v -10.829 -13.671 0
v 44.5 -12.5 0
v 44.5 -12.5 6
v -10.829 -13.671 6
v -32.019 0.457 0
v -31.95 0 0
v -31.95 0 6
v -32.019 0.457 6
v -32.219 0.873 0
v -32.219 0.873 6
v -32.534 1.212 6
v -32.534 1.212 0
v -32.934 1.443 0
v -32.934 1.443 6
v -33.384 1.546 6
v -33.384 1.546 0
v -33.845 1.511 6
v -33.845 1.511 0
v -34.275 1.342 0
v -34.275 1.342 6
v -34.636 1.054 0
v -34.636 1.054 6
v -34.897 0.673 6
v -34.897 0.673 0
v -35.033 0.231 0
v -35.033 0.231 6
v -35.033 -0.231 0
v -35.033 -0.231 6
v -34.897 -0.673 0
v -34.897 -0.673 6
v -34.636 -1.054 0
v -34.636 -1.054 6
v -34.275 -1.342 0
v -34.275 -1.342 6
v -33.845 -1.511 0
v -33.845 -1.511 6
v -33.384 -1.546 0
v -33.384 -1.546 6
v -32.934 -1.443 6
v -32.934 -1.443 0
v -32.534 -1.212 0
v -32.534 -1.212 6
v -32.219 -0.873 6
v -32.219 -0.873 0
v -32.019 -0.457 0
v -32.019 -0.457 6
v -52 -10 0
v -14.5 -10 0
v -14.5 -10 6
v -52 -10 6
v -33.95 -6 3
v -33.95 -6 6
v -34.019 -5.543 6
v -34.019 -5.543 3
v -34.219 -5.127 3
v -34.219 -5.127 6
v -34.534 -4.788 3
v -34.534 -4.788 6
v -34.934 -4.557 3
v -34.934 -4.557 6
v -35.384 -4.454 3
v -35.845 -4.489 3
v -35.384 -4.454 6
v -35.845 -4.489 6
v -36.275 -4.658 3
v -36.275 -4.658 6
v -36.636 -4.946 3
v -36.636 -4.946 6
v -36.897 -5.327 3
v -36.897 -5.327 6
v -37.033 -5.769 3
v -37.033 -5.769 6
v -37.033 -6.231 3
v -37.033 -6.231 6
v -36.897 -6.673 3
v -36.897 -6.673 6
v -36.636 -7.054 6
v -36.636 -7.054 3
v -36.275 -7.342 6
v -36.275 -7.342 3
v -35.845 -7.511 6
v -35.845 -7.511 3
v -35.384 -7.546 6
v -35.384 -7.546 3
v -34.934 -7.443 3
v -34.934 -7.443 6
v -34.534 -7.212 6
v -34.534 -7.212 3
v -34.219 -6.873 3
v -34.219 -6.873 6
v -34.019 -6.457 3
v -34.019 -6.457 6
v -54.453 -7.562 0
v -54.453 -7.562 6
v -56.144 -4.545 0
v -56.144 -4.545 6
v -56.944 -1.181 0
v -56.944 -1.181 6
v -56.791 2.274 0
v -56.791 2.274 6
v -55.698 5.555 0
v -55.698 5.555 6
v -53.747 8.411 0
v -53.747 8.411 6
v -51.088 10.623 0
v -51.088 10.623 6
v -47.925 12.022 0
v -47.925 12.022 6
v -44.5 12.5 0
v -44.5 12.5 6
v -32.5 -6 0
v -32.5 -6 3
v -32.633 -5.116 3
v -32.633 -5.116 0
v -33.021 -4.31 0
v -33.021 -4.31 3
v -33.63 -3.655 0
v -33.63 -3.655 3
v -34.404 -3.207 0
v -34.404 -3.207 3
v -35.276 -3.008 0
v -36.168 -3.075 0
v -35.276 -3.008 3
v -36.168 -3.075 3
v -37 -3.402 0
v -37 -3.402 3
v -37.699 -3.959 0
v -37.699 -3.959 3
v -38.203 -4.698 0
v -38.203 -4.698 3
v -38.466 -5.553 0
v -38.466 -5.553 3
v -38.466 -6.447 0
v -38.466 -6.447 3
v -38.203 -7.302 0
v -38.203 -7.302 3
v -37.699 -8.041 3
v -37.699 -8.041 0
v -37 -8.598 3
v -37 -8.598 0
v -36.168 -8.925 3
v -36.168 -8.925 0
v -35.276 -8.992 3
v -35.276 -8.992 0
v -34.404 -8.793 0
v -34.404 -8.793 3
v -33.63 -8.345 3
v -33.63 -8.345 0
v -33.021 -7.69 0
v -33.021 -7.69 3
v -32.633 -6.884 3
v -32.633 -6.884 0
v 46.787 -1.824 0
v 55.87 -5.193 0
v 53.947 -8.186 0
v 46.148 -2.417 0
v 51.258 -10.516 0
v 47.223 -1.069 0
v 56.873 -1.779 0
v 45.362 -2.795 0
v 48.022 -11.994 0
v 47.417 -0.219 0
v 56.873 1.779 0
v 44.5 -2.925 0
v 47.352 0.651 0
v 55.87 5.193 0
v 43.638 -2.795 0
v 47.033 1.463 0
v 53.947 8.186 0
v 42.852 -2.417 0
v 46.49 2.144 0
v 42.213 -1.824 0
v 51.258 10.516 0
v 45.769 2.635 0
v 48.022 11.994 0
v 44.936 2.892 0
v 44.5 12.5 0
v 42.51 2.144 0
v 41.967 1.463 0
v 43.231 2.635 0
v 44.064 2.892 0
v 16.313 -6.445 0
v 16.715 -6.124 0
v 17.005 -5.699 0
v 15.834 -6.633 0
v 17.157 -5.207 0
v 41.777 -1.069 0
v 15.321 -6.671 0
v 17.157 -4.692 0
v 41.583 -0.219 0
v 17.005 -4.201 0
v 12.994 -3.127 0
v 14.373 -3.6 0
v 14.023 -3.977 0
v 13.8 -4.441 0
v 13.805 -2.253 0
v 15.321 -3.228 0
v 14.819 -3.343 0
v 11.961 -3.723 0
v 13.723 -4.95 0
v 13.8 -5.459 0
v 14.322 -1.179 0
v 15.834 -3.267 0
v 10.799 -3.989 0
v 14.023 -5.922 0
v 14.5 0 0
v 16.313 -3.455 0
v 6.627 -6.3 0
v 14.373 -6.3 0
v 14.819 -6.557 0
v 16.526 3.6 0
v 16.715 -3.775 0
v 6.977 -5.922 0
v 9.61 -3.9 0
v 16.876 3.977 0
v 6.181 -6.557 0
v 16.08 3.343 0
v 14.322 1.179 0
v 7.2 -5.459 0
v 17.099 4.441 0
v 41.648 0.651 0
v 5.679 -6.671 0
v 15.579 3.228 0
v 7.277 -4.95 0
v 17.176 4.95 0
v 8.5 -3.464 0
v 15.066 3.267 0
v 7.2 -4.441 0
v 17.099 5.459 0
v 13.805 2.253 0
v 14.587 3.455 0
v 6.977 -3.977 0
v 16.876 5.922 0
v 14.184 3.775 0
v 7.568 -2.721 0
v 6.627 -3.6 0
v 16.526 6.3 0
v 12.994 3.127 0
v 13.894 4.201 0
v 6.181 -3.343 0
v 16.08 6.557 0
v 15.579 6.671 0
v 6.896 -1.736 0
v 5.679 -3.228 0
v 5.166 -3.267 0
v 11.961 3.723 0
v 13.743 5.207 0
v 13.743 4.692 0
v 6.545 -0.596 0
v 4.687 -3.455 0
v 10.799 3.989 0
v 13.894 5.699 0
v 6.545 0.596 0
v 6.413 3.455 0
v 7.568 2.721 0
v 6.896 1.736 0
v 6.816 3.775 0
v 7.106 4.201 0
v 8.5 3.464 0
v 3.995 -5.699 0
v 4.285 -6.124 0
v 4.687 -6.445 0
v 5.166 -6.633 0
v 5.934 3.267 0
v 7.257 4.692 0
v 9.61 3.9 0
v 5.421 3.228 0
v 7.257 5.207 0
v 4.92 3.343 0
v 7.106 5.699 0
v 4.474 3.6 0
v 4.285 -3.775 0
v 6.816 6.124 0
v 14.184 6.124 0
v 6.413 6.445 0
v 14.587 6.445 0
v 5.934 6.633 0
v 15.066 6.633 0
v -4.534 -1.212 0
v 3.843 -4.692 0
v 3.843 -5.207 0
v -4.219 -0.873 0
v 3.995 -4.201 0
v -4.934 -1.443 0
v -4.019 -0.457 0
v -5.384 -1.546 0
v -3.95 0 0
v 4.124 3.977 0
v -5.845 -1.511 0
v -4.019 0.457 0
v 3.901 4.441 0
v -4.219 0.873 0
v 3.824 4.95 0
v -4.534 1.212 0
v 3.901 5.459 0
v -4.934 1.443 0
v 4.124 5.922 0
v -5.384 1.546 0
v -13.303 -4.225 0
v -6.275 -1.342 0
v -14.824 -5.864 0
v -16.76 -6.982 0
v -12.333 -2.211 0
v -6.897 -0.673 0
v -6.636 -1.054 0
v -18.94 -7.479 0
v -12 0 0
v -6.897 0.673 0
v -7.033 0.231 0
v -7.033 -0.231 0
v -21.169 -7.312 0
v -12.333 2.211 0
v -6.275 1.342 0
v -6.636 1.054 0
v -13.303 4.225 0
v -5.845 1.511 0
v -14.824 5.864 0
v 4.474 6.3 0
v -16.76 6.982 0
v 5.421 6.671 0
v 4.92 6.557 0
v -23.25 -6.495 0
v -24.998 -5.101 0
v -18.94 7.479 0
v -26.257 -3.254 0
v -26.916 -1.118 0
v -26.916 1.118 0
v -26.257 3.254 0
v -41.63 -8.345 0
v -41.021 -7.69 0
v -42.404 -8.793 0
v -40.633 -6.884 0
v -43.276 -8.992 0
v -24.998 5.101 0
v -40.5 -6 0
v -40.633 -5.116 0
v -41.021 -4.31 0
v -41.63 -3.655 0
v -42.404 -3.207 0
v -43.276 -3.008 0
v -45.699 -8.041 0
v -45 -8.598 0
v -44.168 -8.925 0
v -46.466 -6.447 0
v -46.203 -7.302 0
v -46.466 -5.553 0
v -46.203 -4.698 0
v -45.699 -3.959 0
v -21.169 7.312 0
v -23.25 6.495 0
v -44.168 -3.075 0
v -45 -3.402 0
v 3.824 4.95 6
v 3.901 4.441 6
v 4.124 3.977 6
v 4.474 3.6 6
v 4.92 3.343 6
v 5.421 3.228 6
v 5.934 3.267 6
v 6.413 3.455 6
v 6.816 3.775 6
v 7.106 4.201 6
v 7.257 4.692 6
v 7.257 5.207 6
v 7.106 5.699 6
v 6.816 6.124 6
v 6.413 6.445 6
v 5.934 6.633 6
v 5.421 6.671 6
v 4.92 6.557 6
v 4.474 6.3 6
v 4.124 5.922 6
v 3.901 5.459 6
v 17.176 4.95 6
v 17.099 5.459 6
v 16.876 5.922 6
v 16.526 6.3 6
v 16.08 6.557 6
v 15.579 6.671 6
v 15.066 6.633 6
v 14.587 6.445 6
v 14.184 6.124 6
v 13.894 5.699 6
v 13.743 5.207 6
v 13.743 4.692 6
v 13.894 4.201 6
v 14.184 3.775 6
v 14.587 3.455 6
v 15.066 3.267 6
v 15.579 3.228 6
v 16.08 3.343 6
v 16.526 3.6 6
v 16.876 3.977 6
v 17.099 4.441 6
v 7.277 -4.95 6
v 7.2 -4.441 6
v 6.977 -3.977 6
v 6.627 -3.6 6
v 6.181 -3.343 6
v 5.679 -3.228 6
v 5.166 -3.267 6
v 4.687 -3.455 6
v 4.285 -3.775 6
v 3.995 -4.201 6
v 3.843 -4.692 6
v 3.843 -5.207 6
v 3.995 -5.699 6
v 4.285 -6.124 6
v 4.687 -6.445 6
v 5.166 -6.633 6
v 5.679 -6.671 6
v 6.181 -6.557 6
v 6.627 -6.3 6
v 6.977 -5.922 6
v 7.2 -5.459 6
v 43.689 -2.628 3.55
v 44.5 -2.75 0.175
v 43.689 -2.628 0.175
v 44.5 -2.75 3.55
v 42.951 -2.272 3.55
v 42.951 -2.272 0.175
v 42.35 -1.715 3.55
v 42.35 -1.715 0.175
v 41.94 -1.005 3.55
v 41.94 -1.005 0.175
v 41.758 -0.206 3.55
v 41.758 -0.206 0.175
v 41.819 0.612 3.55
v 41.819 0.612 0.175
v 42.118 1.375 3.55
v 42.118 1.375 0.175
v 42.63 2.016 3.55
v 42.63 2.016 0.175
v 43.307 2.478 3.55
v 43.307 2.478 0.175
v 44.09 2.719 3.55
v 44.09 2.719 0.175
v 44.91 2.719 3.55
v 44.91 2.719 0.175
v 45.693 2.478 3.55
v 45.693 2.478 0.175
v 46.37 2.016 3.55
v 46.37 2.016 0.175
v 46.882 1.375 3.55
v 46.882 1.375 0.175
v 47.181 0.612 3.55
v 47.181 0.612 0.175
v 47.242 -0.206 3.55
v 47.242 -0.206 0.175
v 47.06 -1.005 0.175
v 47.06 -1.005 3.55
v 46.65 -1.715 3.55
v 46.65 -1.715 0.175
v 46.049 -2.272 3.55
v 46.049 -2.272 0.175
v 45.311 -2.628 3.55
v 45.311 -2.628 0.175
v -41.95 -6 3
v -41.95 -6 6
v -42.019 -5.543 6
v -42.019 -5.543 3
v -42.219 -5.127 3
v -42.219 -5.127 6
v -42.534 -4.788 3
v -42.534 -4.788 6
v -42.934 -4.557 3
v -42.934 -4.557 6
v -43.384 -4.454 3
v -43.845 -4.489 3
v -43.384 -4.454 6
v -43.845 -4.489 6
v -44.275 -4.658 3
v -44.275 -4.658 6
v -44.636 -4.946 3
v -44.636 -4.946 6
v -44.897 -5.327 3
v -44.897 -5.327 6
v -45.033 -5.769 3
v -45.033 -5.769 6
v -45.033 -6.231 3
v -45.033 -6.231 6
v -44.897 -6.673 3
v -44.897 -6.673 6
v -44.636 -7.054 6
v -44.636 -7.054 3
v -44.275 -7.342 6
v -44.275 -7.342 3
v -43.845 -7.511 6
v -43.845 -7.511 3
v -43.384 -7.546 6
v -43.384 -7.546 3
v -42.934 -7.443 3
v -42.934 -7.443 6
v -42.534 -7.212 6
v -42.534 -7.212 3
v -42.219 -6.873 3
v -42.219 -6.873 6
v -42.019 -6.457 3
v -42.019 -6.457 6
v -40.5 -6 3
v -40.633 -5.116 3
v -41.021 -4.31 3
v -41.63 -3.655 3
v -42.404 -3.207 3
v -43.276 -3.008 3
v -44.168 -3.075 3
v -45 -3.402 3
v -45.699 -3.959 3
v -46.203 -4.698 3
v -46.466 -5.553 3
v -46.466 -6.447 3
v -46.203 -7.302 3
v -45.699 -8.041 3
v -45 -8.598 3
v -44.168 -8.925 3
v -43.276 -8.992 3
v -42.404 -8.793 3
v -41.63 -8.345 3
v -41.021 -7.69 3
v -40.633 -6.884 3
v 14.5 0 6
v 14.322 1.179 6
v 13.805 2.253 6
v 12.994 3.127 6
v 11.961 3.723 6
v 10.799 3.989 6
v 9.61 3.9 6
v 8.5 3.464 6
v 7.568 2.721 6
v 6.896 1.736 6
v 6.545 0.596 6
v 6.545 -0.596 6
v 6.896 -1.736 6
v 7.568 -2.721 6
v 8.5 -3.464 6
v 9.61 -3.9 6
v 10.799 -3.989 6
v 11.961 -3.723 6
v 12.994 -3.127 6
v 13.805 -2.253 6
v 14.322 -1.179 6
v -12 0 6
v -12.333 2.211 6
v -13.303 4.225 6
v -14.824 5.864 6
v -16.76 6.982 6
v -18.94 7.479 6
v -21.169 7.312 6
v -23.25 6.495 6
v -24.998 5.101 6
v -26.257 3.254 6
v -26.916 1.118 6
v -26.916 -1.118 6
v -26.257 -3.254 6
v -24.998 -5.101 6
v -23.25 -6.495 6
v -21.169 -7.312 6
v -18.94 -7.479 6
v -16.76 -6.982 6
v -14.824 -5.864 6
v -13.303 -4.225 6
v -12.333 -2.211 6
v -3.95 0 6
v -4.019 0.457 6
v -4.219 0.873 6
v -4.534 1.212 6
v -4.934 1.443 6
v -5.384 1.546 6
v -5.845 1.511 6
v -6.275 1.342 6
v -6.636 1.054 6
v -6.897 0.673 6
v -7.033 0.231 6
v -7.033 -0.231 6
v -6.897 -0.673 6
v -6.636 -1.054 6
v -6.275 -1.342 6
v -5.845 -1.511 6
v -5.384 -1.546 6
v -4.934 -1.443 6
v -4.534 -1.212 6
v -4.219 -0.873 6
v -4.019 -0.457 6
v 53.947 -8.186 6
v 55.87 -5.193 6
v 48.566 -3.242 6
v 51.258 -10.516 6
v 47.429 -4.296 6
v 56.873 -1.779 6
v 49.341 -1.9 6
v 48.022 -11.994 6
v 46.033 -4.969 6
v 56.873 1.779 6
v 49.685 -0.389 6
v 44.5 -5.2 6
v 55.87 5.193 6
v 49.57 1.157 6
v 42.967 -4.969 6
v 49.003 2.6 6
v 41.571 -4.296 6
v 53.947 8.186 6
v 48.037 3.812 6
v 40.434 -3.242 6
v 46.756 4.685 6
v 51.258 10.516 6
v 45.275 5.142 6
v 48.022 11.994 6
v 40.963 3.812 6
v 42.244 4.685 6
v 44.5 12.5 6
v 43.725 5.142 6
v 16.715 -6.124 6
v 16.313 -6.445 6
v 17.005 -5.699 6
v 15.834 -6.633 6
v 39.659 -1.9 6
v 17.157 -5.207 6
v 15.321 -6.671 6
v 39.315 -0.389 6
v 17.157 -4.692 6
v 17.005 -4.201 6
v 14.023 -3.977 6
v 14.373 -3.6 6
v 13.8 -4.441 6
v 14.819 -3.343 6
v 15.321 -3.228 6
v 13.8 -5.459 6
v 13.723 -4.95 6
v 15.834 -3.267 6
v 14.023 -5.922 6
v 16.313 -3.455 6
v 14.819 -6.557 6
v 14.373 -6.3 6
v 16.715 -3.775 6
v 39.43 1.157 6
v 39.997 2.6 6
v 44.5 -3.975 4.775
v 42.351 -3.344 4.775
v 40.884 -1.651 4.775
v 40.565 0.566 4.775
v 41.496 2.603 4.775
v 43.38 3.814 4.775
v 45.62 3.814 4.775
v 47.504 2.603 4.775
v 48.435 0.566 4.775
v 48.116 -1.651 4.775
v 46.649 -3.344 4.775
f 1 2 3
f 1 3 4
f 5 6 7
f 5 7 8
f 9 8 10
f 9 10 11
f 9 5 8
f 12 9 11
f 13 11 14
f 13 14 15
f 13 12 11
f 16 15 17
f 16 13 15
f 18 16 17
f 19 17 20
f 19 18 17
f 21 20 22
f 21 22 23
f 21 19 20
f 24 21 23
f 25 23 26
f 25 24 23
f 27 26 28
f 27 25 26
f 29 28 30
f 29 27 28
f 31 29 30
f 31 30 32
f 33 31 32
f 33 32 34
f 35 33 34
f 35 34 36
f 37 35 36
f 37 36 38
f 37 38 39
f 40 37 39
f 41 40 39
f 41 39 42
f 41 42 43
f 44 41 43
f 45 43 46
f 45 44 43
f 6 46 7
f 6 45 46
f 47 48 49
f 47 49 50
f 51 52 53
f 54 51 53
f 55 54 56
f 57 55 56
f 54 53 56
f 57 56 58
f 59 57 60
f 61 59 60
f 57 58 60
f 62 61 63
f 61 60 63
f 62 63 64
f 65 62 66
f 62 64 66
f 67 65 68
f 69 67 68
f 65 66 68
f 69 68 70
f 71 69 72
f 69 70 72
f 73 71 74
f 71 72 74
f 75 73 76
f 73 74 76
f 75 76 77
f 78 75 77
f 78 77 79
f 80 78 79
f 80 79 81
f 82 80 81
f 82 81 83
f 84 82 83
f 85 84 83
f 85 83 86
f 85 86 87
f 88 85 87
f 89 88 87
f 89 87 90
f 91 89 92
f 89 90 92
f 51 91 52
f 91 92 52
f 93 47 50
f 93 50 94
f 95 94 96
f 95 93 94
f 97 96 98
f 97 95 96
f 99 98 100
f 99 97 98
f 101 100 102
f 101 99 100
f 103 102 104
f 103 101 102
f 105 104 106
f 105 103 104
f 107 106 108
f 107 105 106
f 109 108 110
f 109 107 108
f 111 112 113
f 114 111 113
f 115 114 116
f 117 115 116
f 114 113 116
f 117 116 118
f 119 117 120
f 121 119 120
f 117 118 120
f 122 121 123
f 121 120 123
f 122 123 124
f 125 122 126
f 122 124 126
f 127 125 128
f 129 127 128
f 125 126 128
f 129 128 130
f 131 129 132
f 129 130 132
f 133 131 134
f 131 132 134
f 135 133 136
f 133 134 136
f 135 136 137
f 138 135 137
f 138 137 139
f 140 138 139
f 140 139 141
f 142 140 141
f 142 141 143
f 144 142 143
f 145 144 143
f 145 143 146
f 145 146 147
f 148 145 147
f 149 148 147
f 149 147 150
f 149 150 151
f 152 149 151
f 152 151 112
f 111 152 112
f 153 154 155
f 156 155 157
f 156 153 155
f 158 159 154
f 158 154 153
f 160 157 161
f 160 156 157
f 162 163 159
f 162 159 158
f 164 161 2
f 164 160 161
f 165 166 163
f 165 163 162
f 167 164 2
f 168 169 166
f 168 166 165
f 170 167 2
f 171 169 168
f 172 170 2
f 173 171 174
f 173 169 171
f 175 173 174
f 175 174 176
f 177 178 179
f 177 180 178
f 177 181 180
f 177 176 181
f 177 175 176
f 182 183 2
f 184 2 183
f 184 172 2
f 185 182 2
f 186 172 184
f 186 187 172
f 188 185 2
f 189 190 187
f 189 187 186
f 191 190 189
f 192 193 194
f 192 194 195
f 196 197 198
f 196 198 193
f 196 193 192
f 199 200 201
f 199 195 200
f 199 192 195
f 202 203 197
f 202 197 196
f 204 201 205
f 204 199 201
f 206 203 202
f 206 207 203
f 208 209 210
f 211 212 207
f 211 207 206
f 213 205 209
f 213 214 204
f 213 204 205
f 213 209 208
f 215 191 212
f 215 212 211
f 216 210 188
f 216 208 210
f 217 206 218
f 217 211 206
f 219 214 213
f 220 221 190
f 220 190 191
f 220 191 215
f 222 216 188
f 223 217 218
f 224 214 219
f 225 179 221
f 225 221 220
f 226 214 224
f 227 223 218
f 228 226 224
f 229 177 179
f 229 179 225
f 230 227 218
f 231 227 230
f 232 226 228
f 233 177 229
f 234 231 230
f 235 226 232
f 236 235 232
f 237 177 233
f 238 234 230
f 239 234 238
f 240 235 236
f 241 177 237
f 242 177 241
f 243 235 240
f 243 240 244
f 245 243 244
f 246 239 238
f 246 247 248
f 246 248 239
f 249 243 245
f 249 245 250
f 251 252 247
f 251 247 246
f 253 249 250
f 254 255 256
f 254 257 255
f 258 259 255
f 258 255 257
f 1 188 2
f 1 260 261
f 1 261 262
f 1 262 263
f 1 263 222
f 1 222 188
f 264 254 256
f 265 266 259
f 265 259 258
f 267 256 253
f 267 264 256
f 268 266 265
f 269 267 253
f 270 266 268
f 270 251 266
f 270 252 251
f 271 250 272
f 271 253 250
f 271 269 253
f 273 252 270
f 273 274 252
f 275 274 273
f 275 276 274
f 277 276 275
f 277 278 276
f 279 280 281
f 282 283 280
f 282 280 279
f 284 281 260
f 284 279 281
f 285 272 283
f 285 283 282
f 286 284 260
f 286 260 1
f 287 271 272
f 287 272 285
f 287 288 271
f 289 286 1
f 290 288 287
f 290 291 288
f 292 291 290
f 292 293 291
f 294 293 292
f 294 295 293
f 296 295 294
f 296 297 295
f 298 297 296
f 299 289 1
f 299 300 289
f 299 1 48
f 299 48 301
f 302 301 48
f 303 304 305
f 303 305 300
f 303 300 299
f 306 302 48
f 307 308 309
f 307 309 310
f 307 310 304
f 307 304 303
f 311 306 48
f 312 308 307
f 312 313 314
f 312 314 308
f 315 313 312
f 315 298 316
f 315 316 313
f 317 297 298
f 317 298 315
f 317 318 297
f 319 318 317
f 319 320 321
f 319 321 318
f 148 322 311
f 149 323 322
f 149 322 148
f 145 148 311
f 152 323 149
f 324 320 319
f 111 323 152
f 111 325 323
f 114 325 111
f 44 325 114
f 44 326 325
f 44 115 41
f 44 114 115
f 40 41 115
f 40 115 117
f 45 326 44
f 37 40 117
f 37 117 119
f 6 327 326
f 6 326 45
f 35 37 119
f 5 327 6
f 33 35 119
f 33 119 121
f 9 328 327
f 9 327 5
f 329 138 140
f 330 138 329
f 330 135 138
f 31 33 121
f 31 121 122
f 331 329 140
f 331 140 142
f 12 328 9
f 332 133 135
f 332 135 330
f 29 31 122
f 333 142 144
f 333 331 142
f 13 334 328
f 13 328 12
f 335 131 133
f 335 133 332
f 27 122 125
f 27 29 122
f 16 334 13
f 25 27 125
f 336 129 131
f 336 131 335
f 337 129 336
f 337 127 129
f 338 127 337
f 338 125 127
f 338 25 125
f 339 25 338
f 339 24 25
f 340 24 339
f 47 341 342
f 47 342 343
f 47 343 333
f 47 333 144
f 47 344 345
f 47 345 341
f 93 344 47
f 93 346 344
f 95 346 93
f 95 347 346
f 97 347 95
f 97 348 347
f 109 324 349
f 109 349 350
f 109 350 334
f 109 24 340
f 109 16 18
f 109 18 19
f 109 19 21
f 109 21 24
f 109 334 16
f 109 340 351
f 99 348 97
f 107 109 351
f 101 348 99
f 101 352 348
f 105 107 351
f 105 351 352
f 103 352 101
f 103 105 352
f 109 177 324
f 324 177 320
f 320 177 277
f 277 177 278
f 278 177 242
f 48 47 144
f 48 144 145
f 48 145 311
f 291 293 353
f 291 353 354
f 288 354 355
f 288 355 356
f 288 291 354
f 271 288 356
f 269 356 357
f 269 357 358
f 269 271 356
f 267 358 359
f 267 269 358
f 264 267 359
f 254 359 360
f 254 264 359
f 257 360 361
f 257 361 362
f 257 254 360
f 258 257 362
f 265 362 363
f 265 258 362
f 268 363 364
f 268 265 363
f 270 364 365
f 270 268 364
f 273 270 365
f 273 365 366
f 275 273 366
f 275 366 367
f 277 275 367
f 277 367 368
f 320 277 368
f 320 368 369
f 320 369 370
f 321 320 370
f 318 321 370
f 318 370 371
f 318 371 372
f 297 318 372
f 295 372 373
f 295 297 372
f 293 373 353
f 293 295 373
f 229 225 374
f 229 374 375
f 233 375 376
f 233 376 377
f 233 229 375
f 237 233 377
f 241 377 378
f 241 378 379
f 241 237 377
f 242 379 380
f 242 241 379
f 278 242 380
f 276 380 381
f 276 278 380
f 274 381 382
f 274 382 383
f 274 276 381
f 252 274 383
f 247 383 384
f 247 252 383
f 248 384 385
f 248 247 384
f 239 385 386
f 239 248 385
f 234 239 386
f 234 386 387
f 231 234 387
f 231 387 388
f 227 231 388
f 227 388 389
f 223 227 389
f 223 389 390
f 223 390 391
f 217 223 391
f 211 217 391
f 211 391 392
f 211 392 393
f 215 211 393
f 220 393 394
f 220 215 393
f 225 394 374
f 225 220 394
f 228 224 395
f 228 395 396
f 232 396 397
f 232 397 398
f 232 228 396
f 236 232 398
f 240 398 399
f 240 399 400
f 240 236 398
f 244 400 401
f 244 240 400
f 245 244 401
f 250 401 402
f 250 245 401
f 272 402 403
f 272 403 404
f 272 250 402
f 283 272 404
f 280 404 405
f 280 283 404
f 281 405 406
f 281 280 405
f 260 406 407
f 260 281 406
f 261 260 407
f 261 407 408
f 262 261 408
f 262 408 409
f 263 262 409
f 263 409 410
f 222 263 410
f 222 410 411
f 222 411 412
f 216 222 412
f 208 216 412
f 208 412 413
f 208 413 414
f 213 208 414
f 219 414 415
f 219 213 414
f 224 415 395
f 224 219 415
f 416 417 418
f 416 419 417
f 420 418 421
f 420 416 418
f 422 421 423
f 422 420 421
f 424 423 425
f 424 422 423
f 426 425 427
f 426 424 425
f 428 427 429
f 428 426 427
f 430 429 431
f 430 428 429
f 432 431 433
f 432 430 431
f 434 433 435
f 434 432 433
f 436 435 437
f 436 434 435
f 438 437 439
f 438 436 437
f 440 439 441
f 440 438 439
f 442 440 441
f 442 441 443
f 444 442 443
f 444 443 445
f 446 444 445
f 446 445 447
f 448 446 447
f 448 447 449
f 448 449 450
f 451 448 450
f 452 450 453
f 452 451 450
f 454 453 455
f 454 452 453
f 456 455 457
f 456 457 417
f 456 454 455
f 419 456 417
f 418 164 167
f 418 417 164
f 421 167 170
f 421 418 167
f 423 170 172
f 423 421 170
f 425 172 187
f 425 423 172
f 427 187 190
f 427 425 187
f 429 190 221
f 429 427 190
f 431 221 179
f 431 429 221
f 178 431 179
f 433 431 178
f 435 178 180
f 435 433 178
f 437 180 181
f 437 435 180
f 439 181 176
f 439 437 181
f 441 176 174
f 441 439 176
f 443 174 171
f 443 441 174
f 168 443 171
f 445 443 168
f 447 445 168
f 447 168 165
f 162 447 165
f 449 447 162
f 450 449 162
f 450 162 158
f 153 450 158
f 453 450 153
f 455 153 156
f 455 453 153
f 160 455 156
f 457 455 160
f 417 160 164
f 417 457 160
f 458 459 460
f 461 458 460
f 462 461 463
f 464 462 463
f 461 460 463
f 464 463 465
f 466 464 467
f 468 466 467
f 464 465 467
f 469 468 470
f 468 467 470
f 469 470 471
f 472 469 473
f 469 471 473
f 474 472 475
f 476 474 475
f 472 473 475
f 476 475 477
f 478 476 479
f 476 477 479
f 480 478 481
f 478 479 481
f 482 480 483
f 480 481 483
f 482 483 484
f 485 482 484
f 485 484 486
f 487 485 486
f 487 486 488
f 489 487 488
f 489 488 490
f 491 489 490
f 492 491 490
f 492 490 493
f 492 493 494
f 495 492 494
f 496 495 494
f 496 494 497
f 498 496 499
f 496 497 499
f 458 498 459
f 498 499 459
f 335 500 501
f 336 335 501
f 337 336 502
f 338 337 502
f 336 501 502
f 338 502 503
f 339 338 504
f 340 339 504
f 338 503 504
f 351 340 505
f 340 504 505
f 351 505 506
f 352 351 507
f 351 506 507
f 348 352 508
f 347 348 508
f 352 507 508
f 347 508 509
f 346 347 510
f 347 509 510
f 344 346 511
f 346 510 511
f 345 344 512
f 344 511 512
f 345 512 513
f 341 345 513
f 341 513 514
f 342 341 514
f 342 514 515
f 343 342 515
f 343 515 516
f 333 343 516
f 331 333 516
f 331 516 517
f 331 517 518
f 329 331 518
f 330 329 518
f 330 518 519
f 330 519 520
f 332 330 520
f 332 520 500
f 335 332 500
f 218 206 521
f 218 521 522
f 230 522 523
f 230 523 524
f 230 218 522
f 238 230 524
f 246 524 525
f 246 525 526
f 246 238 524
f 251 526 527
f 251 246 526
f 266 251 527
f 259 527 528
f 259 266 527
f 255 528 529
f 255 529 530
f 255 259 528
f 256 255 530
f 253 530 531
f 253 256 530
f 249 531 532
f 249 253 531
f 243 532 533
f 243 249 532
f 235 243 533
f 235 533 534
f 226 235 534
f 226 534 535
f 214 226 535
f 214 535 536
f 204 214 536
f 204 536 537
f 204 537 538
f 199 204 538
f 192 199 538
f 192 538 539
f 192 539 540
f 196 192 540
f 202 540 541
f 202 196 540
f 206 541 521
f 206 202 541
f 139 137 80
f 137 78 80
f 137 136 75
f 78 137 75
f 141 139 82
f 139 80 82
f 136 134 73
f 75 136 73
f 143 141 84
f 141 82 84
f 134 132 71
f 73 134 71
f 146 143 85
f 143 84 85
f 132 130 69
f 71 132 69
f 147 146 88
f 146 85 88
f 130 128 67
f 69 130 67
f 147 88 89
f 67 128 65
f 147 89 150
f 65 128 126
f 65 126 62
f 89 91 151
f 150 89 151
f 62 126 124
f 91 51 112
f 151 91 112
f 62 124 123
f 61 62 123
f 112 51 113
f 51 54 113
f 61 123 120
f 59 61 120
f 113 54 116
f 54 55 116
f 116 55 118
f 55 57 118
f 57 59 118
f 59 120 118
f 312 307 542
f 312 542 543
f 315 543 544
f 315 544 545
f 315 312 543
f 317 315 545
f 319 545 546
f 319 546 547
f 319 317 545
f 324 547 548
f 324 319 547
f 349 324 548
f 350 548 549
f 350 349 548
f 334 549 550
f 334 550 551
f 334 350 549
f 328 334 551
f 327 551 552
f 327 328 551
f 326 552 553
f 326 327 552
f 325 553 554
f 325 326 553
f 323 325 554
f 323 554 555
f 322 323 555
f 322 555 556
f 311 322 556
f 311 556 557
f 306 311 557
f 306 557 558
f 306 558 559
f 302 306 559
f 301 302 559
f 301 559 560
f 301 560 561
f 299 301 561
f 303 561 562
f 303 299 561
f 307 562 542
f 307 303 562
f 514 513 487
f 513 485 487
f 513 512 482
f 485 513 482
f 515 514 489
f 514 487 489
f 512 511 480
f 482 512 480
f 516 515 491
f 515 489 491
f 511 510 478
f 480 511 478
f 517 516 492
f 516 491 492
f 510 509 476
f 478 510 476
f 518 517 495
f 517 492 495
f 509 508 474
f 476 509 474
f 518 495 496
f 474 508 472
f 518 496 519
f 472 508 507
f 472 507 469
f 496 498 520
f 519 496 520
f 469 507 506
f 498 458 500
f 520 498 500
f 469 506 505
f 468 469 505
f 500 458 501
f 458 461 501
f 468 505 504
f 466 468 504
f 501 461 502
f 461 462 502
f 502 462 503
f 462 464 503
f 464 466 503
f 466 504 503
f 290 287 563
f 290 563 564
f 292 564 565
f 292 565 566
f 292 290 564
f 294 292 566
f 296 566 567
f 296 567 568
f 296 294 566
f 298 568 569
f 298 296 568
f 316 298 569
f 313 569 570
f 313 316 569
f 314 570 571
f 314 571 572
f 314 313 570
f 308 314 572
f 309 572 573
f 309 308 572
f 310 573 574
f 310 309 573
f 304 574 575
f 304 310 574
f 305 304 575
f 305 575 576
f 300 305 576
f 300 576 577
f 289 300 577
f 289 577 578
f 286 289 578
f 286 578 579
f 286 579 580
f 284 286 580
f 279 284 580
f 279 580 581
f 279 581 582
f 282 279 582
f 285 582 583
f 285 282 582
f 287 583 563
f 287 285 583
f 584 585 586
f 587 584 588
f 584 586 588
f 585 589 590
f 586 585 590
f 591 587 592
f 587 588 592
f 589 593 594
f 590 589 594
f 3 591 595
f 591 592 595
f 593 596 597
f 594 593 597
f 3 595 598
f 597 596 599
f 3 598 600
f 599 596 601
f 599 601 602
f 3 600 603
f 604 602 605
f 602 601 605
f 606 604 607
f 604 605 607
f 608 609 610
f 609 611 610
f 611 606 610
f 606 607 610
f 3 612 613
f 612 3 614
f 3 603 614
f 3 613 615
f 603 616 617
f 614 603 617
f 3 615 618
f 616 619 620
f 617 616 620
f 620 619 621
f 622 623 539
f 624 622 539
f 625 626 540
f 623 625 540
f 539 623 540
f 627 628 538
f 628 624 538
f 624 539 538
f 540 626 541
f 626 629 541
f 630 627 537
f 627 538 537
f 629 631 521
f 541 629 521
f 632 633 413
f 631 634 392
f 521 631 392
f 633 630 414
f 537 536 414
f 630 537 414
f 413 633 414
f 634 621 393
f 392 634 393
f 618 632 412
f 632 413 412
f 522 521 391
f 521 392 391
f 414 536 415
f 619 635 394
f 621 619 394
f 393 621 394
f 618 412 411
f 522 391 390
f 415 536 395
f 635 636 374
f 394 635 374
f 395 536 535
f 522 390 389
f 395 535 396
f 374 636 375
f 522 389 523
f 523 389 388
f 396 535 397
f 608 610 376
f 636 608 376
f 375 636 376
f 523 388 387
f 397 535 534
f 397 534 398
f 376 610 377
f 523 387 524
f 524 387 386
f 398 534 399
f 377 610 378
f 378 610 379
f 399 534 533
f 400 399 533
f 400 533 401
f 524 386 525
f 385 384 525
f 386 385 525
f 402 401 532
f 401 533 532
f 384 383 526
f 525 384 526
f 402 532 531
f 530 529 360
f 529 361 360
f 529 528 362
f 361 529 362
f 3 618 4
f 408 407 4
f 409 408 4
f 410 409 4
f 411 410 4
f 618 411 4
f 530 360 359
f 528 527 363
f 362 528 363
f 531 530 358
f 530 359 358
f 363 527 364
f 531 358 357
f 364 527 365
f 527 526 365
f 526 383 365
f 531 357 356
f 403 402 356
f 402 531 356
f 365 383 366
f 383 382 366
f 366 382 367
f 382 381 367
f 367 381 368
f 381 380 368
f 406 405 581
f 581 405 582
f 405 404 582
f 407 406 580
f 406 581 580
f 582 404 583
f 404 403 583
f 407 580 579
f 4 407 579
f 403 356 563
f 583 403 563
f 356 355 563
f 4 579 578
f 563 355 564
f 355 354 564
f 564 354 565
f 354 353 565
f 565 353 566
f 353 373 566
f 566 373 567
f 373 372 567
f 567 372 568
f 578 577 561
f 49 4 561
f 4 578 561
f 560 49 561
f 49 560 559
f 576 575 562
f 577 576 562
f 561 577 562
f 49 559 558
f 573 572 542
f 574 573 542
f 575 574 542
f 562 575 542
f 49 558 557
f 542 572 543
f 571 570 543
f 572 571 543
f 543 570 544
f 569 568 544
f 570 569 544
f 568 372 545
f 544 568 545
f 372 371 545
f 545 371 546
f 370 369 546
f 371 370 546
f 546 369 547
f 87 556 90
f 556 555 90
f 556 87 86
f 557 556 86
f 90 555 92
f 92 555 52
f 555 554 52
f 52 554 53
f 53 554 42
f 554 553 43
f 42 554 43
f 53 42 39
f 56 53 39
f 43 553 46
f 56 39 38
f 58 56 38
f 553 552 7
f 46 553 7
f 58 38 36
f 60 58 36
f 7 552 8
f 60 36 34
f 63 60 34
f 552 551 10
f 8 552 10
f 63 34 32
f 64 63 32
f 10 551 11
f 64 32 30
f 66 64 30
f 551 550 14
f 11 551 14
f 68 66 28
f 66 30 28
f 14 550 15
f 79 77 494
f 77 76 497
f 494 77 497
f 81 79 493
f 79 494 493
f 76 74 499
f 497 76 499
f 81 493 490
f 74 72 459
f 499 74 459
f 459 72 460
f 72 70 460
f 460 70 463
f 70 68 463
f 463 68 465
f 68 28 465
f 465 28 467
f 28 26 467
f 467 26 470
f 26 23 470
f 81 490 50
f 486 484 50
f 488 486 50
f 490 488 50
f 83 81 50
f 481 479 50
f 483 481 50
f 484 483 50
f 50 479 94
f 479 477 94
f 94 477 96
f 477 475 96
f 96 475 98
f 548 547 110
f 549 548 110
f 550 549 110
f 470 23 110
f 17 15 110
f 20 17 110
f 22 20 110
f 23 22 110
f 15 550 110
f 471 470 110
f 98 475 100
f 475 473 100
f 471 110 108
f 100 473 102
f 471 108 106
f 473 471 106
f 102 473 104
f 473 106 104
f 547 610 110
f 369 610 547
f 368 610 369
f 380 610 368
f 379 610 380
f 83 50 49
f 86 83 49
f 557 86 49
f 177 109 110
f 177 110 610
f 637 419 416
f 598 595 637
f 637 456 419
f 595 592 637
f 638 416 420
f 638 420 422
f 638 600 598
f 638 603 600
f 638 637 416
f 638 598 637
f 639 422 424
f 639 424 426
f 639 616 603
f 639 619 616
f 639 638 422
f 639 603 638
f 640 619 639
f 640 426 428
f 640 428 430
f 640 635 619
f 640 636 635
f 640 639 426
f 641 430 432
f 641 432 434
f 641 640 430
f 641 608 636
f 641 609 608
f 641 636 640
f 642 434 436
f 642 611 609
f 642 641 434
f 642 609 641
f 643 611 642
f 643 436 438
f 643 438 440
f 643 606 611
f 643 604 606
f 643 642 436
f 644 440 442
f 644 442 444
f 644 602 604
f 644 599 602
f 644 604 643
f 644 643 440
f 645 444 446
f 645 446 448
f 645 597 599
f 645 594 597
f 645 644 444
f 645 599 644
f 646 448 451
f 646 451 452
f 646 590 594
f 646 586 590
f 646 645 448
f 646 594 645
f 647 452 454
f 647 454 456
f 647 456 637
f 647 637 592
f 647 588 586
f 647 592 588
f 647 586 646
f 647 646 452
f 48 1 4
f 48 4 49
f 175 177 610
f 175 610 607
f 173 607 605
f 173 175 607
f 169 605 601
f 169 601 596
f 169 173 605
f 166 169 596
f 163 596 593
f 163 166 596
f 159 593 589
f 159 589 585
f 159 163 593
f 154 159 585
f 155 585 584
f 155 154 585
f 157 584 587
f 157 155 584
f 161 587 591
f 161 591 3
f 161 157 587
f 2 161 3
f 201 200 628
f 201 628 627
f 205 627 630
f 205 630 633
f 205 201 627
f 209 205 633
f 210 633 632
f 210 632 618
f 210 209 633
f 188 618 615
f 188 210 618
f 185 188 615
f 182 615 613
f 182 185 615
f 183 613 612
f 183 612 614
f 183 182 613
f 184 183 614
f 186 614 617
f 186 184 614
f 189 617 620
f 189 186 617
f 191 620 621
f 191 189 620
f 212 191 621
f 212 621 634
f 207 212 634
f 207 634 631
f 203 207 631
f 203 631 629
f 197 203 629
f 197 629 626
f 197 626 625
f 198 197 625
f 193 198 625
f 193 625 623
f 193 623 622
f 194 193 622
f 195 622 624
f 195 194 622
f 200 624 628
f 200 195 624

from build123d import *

# Parameters (mm, degrees)
SKETCH1_R           = 4
SKETCH1_R_2         = 1.726448843
SKETCH1_R_3         = 7.5
SKETCH1_R_4         = 1.55
BOSS_EXTRUDE1_DEPTH = 6
SKETCH4_R           = 1.55
CUT_EXTRUDE1_DEPTH  = 3
SKETCH5_R           = 3
CUT_EXTRUDE2_DEPTH  = 59.693125381


with BuildPart() as part:
    # Sketch1 → Boss-Extrude1 (new body)
    with BuildSketch(Plane.XY):
        with BuildLine():
            Line((-44.5, 12.5), (44.5, 12.5))
            ThreePointArc((44.5, 12.5), (57, 0), (44.5, -12.5))
            Line((44.5, -12.5), (-10.829485489, -13.670514511))
            Line((-10.829485489, -13.670514511), (-14.5, -10))
            Line((-14.5, -10), (-52, -10))
            ThreePointArc((-52, -10), (-56.358541226, 3.952847075), (-44.5, 12.5))
        make_face()
        with Locations((10.5, 0)):
            Circle(SKETCH1_R, mode=Mode.SUBTRACT)
        with Locations((15.449747468, 4.949747468)):
            Circle(SKETCH1_R_2, mode=Mode.SUBTRACT)
        with Locations(Location((5.550252532, 4.949747468, 0), (0, 0, 180))):
            Circle(SKETCH1_R_2, mode=Mode.SUBTRACT)
        with Locations((5.550252532, -4.949747468)):
            Circle(SKETCH1_R_2, mode=Mode.SUBTRACT)
        with Locations(Location((15.449747468, -4.949747468, 0), (0, 0, 180))):
            Circle(SKETCH1_R_2, mode=Mode.SUBTRACT)
        with Locations((-19.5, 0)):
            Circle(SKETCH1_R_3, mode=Mode.SUBTRACT)
        with Locations((-5.5, 0)):
            Circle(SKETCH1_R_4, mode=Mode.SUBTRACT)
        with Locations((-33.5, 0)):
            Circle(SKETCH1_R_4, mode=Mode.SUBTRACT)
    extrude(amount=BOSS_EXTRUDE1_DEPTH)

    # Sketch3 → CSK for M5 Flat Head Machine Screw1 (revolve, cut)
    with BuildSketch(Plane(origin=(44.5, 0, 6), x_dir=(0, -1, 0), z_dir=(1, 0, 0))):
        Polygon((0, 0), (0, 6), (2.925, 6), (2.75, 5.825), (2.75, 2.45), (5.2, 0), align=None)
    revolve(axis=Axis((44.5, 0, 12.35), (0, 0, -1)), mode=Mode.SUBTRACT)

    # Sketch4 → Cut-Extrude1 (cut)
    with BuildSketch(Plane.XY.offset(6)):
        with Locations((-43.5, -6)):
            Circle(SKETCH4_R)
        with Locations((-35.5, -6)):
            Circle(SKETCH4_R)
    extrude(amount=-CUT_EXTRUDE1_DEPTH, mode=Mode.SUBTRACT)

    # Sketch5 → Cut-Extrude2 (cut, through all)
    with BuildSketch(Plane.XY.offset(3)):
        with Locations((-35.5, -6)):
            Circle(SKETCH5_R)
        with Locations((-43.5, -6)):
            Circle(SKETCH5_R)
    extrude(amount=-CUT_EXTRUDE2_DEPTH, mode=Mode.SUBTRACT)


solid = part.part
